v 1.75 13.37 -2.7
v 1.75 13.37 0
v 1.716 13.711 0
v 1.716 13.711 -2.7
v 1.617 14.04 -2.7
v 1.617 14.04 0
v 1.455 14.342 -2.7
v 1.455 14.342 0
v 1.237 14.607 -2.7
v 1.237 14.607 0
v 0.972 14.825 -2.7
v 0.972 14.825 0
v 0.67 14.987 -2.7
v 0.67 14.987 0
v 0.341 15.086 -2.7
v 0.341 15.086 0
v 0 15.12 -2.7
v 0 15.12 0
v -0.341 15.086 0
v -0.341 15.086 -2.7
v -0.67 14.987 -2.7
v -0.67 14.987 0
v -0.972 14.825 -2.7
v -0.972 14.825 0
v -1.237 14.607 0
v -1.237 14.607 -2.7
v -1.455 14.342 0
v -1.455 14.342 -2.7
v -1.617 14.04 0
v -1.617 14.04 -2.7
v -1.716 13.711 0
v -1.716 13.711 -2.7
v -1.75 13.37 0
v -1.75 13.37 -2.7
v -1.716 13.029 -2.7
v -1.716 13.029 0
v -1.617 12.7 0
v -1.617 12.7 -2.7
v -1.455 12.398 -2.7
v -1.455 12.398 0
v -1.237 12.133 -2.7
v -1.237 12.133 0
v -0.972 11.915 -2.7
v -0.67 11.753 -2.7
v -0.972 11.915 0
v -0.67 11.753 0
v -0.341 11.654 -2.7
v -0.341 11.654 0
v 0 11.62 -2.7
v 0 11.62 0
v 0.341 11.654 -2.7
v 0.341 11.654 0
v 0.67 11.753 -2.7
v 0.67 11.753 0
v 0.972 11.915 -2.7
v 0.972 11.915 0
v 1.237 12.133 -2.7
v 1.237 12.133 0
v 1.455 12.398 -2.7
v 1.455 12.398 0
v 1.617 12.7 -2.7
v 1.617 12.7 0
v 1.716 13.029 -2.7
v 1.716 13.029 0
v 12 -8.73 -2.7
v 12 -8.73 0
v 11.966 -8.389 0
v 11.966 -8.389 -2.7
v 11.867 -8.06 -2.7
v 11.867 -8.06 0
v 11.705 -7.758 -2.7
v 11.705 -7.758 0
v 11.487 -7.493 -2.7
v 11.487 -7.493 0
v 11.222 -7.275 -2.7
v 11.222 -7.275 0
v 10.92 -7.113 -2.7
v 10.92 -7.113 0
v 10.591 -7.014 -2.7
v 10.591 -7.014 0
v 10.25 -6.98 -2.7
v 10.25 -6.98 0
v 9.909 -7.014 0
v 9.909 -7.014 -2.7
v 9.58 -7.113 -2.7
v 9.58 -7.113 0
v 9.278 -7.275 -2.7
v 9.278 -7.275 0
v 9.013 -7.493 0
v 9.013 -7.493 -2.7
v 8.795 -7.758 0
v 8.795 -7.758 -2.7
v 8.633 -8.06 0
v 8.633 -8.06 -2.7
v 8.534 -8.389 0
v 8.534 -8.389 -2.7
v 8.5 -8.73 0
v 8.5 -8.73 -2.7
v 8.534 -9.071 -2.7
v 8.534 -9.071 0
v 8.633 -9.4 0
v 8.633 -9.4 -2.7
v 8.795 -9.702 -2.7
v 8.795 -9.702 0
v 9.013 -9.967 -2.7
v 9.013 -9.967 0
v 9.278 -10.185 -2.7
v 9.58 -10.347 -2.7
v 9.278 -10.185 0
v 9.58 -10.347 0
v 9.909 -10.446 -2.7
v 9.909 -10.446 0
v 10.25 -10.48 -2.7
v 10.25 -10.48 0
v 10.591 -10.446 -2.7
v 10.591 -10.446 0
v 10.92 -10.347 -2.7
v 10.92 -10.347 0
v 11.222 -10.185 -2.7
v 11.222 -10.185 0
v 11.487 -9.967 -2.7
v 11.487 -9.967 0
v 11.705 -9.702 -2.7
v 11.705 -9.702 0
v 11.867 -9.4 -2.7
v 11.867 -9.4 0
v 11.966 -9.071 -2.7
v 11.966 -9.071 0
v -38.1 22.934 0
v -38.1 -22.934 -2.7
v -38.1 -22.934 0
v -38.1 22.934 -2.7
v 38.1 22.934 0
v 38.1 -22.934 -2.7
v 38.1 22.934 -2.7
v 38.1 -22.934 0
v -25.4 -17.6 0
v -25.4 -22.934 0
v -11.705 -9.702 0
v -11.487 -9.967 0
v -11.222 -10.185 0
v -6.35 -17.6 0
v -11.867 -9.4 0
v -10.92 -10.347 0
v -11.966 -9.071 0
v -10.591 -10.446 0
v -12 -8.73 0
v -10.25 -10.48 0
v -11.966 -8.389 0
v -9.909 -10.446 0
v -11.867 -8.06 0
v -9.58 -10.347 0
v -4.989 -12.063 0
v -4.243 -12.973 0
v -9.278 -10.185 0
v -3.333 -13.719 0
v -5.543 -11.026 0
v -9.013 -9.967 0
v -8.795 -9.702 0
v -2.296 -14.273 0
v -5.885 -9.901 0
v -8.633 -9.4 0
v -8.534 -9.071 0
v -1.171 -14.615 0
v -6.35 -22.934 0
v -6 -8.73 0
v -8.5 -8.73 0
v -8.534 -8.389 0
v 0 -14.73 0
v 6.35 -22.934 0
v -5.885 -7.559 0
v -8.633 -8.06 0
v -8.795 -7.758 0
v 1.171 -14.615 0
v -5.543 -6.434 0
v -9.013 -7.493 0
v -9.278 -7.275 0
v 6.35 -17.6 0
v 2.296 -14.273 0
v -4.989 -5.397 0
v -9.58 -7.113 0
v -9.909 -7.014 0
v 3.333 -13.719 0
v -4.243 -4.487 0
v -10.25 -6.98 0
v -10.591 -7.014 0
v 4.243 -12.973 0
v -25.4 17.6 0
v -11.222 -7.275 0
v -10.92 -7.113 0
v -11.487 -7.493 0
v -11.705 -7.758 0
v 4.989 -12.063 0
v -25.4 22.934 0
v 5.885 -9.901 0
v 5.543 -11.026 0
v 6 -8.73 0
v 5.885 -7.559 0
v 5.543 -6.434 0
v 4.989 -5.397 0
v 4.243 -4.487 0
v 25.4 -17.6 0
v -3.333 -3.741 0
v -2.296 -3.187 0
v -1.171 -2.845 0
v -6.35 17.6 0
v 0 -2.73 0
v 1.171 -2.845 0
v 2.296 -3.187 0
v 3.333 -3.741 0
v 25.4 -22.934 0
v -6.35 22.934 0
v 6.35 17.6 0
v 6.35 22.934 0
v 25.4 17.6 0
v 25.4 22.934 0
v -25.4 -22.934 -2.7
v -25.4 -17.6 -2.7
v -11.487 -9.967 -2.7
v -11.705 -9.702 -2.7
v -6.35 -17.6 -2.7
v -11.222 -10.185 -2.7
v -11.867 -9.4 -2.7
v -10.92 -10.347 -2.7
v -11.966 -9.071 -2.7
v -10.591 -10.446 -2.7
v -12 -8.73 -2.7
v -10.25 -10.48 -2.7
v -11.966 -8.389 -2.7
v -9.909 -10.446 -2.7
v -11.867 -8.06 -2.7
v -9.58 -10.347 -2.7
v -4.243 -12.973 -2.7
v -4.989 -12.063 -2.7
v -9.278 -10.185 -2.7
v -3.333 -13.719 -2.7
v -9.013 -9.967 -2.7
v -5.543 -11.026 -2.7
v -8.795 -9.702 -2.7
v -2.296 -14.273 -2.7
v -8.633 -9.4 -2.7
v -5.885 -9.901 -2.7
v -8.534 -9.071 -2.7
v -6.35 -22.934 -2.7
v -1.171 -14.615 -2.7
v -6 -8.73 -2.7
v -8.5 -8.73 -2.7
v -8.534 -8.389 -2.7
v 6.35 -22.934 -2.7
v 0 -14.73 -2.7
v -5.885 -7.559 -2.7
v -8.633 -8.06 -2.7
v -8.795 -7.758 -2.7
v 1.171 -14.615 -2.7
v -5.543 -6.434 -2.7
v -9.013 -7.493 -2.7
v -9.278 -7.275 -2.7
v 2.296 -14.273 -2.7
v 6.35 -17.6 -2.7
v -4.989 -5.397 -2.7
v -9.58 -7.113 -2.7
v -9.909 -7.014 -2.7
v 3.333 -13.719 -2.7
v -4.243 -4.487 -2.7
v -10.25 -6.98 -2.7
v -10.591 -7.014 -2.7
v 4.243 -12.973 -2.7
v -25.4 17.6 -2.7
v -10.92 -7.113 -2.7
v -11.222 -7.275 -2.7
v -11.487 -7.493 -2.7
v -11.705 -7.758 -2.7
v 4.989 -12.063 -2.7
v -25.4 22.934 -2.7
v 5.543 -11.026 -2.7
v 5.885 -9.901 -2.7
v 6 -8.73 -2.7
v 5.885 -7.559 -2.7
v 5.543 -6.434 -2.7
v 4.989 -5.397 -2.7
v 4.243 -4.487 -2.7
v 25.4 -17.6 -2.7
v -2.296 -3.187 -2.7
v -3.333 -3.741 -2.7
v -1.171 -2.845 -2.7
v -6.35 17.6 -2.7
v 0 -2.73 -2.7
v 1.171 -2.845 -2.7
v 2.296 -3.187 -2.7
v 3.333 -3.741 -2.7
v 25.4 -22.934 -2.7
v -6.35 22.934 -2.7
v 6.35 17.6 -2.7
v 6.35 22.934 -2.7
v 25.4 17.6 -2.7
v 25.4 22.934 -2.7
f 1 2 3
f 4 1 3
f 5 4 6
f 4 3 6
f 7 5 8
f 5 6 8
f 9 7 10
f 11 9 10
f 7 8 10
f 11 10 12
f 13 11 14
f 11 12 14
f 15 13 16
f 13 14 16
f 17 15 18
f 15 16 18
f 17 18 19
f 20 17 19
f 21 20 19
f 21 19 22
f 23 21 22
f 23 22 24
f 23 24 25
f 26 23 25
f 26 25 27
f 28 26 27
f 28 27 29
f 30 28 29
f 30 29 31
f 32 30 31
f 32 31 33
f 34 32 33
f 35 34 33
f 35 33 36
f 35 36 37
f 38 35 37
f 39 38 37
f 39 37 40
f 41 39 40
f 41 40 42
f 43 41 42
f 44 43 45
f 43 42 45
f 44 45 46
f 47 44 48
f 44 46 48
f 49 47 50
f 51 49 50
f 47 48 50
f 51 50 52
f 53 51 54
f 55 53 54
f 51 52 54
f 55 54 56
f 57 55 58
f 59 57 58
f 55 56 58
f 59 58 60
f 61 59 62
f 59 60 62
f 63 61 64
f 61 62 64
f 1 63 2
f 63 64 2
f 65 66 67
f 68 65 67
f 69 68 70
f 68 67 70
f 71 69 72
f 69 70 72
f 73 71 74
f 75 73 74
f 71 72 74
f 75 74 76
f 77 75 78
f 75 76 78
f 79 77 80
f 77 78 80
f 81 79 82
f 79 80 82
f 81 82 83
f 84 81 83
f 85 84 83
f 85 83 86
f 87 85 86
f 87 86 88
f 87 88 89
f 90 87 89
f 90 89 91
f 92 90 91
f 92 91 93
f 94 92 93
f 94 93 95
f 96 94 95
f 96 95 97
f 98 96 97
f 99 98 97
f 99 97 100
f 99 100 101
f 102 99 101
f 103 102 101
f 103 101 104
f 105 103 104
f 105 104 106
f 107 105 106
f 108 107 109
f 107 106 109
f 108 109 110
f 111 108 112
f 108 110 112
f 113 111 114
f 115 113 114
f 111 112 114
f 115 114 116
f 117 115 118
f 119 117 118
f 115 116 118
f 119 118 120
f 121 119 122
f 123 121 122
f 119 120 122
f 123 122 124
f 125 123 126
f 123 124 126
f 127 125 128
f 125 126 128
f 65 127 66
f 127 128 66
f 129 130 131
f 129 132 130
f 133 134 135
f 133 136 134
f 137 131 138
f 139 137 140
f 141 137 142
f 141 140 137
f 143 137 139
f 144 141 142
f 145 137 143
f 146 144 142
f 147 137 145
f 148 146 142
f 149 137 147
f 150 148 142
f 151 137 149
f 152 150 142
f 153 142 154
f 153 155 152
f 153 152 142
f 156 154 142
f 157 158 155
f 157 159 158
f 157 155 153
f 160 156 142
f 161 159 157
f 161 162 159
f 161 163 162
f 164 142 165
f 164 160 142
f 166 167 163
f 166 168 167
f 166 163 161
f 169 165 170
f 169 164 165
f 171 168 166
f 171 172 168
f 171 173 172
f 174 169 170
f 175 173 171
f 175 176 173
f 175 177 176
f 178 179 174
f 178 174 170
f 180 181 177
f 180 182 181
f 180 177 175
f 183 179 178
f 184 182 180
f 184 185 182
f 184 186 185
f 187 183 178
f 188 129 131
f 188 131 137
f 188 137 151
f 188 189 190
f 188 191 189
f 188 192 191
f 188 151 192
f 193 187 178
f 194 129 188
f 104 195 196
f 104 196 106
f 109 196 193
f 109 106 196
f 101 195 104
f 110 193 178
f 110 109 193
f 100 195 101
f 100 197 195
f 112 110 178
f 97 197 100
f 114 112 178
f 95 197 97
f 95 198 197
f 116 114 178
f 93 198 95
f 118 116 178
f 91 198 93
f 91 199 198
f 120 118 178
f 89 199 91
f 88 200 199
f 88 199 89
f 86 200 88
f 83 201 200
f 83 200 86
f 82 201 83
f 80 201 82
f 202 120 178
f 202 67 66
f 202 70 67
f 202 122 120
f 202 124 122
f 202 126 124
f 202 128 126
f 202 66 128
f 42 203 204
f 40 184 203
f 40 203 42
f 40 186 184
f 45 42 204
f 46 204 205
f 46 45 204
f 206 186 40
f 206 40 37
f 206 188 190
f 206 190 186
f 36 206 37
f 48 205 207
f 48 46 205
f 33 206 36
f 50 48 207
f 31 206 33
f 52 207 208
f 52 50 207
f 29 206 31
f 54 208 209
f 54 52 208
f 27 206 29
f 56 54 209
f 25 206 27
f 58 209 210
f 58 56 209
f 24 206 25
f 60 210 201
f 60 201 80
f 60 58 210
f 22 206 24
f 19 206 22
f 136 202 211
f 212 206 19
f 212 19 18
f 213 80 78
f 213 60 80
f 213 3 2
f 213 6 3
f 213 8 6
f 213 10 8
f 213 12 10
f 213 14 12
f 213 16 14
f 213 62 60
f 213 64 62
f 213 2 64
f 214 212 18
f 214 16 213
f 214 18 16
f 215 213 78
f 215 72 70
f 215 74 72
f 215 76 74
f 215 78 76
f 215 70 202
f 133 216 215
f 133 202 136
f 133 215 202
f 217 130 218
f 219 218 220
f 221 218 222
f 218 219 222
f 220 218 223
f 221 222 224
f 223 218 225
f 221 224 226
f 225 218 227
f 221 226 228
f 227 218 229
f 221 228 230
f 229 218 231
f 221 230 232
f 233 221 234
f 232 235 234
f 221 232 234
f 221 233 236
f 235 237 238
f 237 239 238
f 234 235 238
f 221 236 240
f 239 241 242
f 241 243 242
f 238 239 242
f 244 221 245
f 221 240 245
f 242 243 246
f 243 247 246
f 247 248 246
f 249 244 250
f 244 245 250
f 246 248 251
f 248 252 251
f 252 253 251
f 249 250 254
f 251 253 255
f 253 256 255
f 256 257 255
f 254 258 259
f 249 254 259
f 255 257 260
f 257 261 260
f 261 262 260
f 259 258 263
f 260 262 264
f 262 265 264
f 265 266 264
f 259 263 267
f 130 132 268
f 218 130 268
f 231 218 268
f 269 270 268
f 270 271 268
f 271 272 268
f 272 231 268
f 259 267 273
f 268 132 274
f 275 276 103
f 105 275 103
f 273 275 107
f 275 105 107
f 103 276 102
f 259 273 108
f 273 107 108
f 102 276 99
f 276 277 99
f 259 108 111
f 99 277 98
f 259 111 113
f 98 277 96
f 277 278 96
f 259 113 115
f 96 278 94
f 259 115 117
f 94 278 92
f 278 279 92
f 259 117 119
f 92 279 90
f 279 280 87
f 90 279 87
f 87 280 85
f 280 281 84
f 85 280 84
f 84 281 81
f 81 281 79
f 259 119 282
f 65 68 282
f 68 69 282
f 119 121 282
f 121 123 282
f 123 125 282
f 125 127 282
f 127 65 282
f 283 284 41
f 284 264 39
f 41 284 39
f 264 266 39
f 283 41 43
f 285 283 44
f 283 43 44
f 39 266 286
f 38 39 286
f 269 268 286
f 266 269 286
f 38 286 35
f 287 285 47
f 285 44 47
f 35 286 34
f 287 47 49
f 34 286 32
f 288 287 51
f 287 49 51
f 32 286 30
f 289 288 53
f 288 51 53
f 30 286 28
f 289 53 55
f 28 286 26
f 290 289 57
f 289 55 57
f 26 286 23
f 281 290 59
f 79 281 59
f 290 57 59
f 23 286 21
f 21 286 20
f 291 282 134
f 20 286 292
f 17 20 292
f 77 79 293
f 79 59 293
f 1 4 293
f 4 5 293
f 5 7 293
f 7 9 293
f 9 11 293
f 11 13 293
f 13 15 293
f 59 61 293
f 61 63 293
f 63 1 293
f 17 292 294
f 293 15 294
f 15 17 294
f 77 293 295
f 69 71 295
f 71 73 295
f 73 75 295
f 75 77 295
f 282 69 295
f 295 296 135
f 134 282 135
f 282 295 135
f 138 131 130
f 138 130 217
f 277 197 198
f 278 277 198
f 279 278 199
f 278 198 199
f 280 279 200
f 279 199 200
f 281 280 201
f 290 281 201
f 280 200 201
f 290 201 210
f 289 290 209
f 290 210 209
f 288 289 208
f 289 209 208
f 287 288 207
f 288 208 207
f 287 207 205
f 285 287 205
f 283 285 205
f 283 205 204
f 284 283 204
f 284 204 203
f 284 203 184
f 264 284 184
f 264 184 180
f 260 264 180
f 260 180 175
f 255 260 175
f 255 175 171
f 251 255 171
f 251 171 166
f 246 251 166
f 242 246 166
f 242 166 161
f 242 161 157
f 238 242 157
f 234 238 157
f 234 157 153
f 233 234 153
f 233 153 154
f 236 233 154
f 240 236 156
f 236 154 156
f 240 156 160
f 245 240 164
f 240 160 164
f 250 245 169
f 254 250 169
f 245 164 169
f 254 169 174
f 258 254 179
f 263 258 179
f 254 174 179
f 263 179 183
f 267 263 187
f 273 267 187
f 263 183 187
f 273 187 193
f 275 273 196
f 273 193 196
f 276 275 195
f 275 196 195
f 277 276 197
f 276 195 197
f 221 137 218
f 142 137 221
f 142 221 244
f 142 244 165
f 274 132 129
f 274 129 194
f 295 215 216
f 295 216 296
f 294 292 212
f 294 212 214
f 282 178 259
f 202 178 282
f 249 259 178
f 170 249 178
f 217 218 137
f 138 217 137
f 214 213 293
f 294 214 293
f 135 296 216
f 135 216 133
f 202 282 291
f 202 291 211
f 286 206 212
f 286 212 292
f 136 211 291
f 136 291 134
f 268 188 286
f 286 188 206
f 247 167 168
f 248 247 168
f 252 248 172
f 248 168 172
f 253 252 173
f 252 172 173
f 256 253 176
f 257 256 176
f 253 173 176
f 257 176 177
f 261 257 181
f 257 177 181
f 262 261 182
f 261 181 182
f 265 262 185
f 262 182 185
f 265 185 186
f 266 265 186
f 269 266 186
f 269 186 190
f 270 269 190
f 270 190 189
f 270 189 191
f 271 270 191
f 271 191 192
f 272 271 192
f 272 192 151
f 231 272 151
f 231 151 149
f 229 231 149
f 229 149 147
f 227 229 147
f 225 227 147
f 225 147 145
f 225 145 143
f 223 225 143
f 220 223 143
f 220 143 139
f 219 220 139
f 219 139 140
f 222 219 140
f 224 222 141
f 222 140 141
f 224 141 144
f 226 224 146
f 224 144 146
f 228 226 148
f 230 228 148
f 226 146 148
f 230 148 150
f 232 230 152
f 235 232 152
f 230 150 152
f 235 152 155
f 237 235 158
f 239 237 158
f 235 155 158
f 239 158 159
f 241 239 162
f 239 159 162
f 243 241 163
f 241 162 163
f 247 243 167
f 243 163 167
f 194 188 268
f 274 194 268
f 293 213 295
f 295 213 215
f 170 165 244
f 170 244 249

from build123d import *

# Parameters (mm, degrees)
SKETCH1_W          = 76.2
SKETCH1_H          = 35.2
BASE_SHAPE_DEPTH   = 2.7
SKETCH2_R          = 6
SKETCH2_R_2        = 1.75
MOTOR_HOLES_DEPTH  = 43.055439601
SKETCH3_W          = 12.7
SKETCH3_H          = 2.7
TOP_TEETH_DEPTH    = 5.334
SKETCH4_W          = 12.7
SKETCH4_H          = 2.7
BOTTOM_TEETH_DEPTH = 5.334


with BuildPart() as part:
    # Sketch1 → Base Shape (new body)
    with BuildSketch(Plane.XY):
        Rectangle(SKETCH1_W, SKETCH1_H)
    extrude(amount=-BASE_SHAPE_DEPTH)

    # Sketch2 → Motor Holes (cut, through all)
    with BuildSketch(Plane.XY):
        with Locations((0, -8.73)):
            Circle(SKETCH2_R)
        with Locations((-10.25, -8.73)):
            Circle(SKETCH2_R_2)
        with Locations((10.25, -8.73)):
            Circle(SKETCH2_R_2)
        with Locations((0, 13.369999996)):
            Circle(SKETCH2_R_2)
    extrude(amount=-MOTOR_HOLES_DEPTH, mode=Mode.SUBTRACT)

    # Sketch3 → Top teeth (add)
    with BuildSketch(Plane(origin=(0, 17.6, 0), x_dir=(1, 0, 0), z_dir=(0, 1, 0))):
        with Locations((-31.75, 1.35)):
            Rectangle(SKETCH3_W, SKETCH3_H)
        with Locations((0, 1.35)):
            Rectangle(SKETCH3_W, SKETCH3_H)
        with Locations((31.75, 1.35)):
            Rectangle(SKETCH3_W, SKETCH3_H)
    extrude(amount=TOP_TEETH_DEPTH)

    # Sketch4 → Bottom teeth (add)
    with BuildSketch(Plane.XZ.offset(17.6)):
        with Locations((-31.75, -1.35)):
            Rectangle(SKETCH4_W, SKETCH4_H)
        with Locations((0, -1.35)):
            Rectangle(SKETCH4_W, SKETCH4_H)
        with Locations((31.75, -1.35)):
            Rectangle(SKETCH4_W, SKETCH4_H)
    extrude(amount=BOTTOM_TEETH_DEPTH)


solid = part.part
